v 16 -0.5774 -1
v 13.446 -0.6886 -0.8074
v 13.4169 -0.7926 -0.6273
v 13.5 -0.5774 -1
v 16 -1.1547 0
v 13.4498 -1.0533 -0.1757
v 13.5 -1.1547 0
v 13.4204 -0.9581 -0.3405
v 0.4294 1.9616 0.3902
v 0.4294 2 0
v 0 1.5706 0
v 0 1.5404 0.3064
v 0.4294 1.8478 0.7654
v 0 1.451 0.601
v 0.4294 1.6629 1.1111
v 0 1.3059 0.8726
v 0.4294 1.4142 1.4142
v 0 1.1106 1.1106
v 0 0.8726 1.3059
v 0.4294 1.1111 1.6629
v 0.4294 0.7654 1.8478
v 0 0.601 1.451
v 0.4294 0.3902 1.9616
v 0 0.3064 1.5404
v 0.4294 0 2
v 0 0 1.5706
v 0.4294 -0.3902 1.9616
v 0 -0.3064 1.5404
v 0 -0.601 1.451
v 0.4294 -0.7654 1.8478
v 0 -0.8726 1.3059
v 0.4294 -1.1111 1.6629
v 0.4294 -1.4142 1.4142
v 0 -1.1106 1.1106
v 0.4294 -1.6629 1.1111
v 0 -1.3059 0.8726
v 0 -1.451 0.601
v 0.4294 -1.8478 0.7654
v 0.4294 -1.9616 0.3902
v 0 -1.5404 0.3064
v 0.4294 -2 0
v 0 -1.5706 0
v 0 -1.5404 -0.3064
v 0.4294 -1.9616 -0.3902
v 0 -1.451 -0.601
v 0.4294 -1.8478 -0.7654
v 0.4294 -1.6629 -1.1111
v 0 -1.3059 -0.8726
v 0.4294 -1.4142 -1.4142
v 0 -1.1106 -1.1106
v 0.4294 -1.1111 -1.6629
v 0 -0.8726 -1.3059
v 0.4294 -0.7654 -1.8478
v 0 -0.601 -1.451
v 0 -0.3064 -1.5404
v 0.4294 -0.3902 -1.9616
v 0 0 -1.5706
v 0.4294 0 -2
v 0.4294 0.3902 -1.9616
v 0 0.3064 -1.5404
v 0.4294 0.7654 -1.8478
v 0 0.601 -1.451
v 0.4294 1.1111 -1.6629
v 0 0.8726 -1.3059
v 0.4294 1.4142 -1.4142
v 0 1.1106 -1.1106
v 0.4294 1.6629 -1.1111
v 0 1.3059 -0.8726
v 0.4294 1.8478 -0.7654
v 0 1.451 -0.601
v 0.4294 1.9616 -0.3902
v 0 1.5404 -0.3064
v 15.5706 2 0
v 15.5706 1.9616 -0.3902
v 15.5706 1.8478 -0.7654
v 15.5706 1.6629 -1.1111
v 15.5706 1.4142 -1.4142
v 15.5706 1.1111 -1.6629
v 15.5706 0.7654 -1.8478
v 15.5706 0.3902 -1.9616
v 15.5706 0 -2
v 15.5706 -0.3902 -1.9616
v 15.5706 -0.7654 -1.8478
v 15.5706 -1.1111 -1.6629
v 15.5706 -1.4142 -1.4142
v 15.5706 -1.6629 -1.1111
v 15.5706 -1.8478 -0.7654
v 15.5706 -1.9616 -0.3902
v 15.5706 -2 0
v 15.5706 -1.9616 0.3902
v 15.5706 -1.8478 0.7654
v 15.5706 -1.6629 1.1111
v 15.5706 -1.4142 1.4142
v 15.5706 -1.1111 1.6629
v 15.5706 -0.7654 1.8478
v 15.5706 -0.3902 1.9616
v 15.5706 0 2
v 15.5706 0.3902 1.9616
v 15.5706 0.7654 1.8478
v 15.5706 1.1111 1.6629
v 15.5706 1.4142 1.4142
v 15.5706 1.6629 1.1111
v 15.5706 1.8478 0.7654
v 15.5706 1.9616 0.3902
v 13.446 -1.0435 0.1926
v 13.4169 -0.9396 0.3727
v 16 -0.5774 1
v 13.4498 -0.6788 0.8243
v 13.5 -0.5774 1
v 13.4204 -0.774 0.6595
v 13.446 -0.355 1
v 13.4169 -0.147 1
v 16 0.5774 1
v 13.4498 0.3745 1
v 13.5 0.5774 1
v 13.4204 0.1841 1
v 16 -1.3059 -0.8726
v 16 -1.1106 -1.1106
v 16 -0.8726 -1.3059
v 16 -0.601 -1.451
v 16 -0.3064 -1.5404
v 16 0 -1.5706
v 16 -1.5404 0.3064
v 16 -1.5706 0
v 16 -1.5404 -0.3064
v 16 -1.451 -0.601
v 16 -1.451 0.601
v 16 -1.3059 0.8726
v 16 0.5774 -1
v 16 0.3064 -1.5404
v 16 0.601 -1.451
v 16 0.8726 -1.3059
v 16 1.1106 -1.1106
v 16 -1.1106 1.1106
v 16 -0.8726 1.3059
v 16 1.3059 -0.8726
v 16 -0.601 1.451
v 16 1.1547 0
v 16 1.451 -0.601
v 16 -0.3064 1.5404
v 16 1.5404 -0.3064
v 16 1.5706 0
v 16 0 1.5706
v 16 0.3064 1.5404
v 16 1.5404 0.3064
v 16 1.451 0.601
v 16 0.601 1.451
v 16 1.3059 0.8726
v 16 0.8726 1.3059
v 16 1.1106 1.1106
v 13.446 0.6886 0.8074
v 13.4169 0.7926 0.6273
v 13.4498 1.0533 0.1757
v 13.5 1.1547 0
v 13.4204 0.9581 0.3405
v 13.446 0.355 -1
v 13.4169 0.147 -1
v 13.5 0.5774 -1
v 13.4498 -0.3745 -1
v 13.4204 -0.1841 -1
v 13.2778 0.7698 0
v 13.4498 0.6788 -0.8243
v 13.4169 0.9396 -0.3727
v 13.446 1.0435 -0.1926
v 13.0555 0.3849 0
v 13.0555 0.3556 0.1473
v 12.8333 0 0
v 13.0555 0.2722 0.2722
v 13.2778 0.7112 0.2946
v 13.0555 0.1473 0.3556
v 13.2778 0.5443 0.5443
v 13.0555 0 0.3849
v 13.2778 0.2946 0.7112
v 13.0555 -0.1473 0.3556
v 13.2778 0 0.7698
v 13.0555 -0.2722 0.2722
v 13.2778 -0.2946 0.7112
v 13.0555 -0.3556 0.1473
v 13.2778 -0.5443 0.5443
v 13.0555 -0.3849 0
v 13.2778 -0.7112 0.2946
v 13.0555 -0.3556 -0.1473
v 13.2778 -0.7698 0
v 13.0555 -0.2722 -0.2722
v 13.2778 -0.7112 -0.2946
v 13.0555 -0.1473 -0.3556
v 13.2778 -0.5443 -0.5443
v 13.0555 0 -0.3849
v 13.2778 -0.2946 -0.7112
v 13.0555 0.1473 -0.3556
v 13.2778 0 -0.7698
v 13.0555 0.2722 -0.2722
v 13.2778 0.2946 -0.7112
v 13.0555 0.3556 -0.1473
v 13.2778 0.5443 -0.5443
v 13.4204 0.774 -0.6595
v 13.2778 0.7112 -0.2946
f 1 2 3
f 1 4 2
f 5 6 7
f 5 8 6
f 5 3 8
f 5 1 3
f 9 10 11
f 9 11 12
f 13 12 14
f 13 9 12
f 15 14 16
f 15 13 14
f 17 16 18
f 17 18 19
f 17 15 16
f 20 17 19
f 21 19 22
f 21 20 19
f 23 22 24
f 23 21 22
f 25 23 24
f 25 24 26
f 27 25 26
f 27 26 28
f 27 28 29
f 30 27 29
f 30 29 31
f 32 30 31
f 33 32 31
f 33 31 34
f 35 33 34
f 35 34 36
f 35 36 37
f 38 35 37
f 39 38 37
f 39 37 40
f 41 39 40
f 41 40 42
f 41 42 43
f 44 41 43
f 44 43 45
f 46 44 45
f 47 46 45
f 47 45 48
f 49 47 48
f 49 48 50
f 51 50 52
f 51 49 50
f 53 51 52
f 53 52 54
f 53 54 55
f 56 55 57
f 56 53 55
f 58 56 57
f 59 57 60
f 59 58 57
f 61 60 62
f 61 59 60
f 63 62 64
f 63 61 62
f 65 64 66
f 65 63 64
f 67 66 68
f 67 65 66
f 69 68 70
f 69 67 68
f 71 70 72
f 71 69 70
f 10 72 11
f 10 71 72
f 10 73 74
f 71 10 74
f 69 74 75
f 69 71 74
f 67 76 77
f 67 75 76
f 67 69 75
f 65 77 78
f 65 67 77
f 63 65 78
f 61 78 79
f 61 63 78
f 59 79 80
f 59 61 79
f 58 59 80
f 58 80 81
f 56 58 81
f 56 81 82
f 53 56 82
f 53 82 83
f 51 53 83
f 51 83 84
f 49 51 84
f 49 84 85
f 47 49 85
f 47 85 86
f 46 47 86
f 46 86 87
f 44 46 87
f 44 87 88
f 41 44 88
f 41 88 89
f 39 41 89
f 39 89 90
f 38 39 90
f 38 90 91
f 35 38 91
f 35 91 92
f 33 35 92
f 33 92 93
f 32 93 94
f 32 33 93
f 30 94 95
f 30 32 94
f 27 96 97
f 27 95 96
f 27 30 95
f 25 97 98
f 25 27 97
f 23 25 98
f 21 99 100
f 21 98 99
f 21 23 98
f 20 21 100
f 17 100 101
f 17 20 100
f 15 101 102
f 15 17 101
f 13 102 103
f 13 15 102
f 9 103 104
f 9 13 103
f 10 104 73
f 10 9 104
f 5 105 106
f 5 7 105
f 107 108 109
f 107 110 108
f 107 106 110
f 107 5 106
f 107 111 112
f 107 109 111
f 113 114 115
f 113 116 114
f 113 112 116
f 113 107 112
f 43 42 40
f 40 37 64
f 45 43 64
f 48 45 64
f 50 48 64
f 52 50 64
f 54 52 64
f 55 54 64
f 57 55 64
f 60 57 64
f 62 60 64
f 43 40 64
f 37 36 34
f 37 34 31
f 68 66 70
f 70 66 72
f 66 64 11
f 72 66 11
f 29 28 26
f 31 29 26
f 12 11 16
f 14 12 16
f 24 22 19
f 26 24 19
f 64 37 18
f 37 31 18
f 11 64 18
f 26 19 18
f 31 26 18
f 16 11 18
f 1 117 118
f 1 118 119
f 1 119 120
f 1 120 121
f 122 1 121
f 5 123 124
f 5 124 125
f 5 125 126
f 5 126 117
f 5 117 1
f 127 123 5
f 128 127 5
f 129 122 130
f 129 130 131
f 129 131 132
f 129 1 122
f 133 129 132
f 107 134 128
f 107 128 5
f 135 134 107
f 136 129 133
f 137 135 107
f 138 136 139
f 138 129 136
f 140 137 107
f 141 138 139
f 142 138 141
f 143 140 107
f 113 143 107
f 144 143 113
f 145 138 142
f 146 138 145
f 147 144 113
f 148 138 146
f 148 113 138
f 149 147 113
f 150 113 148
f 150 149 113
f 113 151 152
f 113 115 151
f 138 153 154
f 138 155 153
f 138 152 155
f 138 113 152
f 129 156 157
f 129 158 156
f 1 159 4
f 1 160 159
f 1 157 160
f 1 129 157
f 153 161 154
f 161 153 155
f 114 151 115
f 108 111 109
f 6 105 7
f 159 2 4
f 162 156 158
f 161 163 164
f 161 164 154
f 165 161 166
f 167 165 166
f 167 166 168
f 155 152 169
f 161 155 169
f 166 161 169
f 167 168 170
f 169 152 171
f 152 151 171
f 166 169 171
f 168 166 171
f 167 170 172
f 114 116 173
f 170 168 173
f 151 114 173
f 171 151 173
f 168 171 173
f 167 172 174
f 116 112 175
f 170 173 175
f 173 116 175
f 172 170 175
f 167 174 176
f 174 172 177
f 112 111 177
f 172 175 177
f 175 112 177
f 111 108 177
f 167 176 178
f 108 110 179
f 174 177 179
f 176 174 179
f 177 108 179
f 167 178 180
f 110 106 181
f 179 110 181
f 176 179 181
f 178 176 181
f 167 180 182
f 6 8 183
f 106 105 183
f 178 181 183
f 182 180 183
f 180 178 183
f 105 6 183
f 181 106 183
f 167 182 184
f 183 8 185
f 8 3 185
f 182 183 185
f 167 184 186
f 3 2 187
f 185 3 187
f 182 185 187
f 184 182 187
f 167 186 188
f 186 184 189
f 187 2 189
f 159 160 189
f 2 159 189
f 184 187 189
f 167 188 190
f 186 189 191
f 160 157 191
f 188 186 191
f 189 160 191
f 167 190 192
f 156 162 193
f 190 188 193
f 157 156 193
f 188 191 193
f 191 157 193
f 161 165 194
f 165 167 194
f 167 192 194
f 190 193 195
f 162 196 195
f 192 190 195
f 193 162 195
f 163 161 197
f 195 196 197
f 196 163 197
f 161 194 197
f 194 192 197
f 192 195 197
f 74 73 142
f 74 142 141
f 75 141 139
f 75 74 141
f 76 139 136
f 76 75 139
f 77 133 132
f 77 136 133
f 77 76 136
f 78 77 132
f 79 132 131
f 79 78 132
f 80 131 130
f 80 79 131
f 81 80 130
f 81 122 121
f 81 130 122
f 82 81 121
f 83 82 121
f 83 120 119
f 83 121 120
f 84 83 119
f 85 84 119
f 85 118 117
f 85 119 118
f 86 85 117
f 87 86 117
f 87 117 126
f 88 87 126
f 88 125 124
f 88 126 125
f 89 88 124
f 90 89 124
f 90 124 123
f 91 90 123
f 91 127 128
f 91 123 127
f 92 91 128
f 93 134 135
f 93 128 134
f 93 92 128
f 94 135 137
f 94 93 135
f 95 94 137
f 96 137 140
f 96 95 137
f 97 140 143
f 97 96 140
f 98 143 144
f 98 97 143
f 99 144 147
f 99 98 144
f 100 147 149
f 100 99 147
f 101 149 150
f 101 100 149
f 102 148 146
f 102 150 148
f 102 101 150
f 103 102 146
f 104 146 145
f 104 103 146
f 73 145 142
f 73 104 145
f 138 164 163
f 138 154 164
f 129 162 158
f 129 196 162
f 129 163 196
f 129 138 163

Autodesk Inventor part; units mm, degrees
ref_plane "YZ Plane" through (0, 0, 0) normal (1, 0, 0) x (0, 1, 0)
ref_plane "XZ Plane" through (0, 0, 0) normal (0, 1, 0) x (-1, 0, 0)
sketch "Skizze1" plane through (0, 0, 0) normal (0, 0, 1) x (1, 0, 0)
  line L0 (0, 0) -> (12.8333, 0)
  line L1 (16, 1.1547) -> (16, 2)
  line L2 (16, 2) -> (0, 2)
  line L3 (16, 1.1547) -> (13.5, 1.1547)
  line L4 (13.5, 1.1547) -> (12.8333, 0)
  line L5 (0, -0.4) -> (0, 2.4) projected
  line L6 (0, 2) -> (0, 0)
  dimension "d0" = 2.5
  dimension "d1" = 60
  dimension "d2" = 4
  dimension "d3" = 2.3094
  dimension "d5" = 16
revolve "Körper" add sketch "Skizze1" angle 360 about axis through (0, 0, 0) along (1, 0, 0)
sketch "Skizze2" plane through (16, 0, 0) normal (1, 0, 0) x (0, 1, 0)
  circle A0 centre (0, 0) radius 1.1547 projected
  line L0 (-0.5774, 1) -> (0.5774, 1)
  line L1 (0.5774, 1) -> (1.1547, 0)
  line L2 (1.1547, 0) -> (0.5774, -1)
  line L3 (0.5774, -1) -> (-0.5774, -1)
  line L4 (-0.5774, -1) -> (-1.1547, 0)
  line L5 (-1.1547, 0) -> (-0.5774, 1)
  point P0 (0, 0)
  point P1 (0, 0)
extrude "Loch" add sketch "Skizze2" against normal up to next contours L1 A0 | A0 L2 | L0 A0 | A0 L3 | L5 A0 | A0 L4
thread "Gewinde" size "M4x0.7" class "6g" standard "ISO Metric profile" length 16
chamfer "Fase1" distance 0.4294 angle 45 1 edges at (16, -2, 0) measured on face at (10.6667, 1.9741, -0.3208)
chamfer "Fase2" distance 0.4294 angle 45 1 edges at (0, -2, 0) measured on face at (5.1902, 1.9935, -0.1609)
ref_plane "Work Plane1" through (8, 0, 0) normal (0, 0, 1) x (1, 0, 0)
equation "\"d0\" = INTI"
equation "\"d2\" = NND"
equation "\"d3\" = 1.1547 * SW"
equation "\"d5\" = NLG"
equation "\"d8\" = NLG"
equation "\"d10\" = -0.5 * GD1 + 0.5 * NND"
equation "\"d11\" = FAWI"
equation "\"d34\" = -0.5 * GD1 + 0.5 * NND"
equation "\"d12\" = -0.5 * GD1 + 0.5 * NND"
equation "\"d13\" = FAWI"
equation "\"d35\" = -0.5 * GD1 + 0.5 * NND"
equation "\"NND\" = 4"
equation "\"NLG\" = 16"
equation "\"INTI\" = 2.5"
equation "\"FAWI\" = 45deg"
equation "\"SW\" = 2"
equation "\"GD1\" = THREADDIA - 1.2269 * PTC"
equation "\"SPD\" = 2.5"
equation "\"GUL\" = 0.61345 * PTC"
equation "\"TOA\" = 30deg"
equation "\"THREADDIA\" = 4"
equation "\"PTC\" = 0.7"
equation "\"FAWI1\" = 45deg"
equation "\"GAL\" = 0.61345 * PTC"
equation "\"E0\" = 1.155 * SW"
properties part number "DIN 913 - M4 x 16" material "Stahl, weich"
